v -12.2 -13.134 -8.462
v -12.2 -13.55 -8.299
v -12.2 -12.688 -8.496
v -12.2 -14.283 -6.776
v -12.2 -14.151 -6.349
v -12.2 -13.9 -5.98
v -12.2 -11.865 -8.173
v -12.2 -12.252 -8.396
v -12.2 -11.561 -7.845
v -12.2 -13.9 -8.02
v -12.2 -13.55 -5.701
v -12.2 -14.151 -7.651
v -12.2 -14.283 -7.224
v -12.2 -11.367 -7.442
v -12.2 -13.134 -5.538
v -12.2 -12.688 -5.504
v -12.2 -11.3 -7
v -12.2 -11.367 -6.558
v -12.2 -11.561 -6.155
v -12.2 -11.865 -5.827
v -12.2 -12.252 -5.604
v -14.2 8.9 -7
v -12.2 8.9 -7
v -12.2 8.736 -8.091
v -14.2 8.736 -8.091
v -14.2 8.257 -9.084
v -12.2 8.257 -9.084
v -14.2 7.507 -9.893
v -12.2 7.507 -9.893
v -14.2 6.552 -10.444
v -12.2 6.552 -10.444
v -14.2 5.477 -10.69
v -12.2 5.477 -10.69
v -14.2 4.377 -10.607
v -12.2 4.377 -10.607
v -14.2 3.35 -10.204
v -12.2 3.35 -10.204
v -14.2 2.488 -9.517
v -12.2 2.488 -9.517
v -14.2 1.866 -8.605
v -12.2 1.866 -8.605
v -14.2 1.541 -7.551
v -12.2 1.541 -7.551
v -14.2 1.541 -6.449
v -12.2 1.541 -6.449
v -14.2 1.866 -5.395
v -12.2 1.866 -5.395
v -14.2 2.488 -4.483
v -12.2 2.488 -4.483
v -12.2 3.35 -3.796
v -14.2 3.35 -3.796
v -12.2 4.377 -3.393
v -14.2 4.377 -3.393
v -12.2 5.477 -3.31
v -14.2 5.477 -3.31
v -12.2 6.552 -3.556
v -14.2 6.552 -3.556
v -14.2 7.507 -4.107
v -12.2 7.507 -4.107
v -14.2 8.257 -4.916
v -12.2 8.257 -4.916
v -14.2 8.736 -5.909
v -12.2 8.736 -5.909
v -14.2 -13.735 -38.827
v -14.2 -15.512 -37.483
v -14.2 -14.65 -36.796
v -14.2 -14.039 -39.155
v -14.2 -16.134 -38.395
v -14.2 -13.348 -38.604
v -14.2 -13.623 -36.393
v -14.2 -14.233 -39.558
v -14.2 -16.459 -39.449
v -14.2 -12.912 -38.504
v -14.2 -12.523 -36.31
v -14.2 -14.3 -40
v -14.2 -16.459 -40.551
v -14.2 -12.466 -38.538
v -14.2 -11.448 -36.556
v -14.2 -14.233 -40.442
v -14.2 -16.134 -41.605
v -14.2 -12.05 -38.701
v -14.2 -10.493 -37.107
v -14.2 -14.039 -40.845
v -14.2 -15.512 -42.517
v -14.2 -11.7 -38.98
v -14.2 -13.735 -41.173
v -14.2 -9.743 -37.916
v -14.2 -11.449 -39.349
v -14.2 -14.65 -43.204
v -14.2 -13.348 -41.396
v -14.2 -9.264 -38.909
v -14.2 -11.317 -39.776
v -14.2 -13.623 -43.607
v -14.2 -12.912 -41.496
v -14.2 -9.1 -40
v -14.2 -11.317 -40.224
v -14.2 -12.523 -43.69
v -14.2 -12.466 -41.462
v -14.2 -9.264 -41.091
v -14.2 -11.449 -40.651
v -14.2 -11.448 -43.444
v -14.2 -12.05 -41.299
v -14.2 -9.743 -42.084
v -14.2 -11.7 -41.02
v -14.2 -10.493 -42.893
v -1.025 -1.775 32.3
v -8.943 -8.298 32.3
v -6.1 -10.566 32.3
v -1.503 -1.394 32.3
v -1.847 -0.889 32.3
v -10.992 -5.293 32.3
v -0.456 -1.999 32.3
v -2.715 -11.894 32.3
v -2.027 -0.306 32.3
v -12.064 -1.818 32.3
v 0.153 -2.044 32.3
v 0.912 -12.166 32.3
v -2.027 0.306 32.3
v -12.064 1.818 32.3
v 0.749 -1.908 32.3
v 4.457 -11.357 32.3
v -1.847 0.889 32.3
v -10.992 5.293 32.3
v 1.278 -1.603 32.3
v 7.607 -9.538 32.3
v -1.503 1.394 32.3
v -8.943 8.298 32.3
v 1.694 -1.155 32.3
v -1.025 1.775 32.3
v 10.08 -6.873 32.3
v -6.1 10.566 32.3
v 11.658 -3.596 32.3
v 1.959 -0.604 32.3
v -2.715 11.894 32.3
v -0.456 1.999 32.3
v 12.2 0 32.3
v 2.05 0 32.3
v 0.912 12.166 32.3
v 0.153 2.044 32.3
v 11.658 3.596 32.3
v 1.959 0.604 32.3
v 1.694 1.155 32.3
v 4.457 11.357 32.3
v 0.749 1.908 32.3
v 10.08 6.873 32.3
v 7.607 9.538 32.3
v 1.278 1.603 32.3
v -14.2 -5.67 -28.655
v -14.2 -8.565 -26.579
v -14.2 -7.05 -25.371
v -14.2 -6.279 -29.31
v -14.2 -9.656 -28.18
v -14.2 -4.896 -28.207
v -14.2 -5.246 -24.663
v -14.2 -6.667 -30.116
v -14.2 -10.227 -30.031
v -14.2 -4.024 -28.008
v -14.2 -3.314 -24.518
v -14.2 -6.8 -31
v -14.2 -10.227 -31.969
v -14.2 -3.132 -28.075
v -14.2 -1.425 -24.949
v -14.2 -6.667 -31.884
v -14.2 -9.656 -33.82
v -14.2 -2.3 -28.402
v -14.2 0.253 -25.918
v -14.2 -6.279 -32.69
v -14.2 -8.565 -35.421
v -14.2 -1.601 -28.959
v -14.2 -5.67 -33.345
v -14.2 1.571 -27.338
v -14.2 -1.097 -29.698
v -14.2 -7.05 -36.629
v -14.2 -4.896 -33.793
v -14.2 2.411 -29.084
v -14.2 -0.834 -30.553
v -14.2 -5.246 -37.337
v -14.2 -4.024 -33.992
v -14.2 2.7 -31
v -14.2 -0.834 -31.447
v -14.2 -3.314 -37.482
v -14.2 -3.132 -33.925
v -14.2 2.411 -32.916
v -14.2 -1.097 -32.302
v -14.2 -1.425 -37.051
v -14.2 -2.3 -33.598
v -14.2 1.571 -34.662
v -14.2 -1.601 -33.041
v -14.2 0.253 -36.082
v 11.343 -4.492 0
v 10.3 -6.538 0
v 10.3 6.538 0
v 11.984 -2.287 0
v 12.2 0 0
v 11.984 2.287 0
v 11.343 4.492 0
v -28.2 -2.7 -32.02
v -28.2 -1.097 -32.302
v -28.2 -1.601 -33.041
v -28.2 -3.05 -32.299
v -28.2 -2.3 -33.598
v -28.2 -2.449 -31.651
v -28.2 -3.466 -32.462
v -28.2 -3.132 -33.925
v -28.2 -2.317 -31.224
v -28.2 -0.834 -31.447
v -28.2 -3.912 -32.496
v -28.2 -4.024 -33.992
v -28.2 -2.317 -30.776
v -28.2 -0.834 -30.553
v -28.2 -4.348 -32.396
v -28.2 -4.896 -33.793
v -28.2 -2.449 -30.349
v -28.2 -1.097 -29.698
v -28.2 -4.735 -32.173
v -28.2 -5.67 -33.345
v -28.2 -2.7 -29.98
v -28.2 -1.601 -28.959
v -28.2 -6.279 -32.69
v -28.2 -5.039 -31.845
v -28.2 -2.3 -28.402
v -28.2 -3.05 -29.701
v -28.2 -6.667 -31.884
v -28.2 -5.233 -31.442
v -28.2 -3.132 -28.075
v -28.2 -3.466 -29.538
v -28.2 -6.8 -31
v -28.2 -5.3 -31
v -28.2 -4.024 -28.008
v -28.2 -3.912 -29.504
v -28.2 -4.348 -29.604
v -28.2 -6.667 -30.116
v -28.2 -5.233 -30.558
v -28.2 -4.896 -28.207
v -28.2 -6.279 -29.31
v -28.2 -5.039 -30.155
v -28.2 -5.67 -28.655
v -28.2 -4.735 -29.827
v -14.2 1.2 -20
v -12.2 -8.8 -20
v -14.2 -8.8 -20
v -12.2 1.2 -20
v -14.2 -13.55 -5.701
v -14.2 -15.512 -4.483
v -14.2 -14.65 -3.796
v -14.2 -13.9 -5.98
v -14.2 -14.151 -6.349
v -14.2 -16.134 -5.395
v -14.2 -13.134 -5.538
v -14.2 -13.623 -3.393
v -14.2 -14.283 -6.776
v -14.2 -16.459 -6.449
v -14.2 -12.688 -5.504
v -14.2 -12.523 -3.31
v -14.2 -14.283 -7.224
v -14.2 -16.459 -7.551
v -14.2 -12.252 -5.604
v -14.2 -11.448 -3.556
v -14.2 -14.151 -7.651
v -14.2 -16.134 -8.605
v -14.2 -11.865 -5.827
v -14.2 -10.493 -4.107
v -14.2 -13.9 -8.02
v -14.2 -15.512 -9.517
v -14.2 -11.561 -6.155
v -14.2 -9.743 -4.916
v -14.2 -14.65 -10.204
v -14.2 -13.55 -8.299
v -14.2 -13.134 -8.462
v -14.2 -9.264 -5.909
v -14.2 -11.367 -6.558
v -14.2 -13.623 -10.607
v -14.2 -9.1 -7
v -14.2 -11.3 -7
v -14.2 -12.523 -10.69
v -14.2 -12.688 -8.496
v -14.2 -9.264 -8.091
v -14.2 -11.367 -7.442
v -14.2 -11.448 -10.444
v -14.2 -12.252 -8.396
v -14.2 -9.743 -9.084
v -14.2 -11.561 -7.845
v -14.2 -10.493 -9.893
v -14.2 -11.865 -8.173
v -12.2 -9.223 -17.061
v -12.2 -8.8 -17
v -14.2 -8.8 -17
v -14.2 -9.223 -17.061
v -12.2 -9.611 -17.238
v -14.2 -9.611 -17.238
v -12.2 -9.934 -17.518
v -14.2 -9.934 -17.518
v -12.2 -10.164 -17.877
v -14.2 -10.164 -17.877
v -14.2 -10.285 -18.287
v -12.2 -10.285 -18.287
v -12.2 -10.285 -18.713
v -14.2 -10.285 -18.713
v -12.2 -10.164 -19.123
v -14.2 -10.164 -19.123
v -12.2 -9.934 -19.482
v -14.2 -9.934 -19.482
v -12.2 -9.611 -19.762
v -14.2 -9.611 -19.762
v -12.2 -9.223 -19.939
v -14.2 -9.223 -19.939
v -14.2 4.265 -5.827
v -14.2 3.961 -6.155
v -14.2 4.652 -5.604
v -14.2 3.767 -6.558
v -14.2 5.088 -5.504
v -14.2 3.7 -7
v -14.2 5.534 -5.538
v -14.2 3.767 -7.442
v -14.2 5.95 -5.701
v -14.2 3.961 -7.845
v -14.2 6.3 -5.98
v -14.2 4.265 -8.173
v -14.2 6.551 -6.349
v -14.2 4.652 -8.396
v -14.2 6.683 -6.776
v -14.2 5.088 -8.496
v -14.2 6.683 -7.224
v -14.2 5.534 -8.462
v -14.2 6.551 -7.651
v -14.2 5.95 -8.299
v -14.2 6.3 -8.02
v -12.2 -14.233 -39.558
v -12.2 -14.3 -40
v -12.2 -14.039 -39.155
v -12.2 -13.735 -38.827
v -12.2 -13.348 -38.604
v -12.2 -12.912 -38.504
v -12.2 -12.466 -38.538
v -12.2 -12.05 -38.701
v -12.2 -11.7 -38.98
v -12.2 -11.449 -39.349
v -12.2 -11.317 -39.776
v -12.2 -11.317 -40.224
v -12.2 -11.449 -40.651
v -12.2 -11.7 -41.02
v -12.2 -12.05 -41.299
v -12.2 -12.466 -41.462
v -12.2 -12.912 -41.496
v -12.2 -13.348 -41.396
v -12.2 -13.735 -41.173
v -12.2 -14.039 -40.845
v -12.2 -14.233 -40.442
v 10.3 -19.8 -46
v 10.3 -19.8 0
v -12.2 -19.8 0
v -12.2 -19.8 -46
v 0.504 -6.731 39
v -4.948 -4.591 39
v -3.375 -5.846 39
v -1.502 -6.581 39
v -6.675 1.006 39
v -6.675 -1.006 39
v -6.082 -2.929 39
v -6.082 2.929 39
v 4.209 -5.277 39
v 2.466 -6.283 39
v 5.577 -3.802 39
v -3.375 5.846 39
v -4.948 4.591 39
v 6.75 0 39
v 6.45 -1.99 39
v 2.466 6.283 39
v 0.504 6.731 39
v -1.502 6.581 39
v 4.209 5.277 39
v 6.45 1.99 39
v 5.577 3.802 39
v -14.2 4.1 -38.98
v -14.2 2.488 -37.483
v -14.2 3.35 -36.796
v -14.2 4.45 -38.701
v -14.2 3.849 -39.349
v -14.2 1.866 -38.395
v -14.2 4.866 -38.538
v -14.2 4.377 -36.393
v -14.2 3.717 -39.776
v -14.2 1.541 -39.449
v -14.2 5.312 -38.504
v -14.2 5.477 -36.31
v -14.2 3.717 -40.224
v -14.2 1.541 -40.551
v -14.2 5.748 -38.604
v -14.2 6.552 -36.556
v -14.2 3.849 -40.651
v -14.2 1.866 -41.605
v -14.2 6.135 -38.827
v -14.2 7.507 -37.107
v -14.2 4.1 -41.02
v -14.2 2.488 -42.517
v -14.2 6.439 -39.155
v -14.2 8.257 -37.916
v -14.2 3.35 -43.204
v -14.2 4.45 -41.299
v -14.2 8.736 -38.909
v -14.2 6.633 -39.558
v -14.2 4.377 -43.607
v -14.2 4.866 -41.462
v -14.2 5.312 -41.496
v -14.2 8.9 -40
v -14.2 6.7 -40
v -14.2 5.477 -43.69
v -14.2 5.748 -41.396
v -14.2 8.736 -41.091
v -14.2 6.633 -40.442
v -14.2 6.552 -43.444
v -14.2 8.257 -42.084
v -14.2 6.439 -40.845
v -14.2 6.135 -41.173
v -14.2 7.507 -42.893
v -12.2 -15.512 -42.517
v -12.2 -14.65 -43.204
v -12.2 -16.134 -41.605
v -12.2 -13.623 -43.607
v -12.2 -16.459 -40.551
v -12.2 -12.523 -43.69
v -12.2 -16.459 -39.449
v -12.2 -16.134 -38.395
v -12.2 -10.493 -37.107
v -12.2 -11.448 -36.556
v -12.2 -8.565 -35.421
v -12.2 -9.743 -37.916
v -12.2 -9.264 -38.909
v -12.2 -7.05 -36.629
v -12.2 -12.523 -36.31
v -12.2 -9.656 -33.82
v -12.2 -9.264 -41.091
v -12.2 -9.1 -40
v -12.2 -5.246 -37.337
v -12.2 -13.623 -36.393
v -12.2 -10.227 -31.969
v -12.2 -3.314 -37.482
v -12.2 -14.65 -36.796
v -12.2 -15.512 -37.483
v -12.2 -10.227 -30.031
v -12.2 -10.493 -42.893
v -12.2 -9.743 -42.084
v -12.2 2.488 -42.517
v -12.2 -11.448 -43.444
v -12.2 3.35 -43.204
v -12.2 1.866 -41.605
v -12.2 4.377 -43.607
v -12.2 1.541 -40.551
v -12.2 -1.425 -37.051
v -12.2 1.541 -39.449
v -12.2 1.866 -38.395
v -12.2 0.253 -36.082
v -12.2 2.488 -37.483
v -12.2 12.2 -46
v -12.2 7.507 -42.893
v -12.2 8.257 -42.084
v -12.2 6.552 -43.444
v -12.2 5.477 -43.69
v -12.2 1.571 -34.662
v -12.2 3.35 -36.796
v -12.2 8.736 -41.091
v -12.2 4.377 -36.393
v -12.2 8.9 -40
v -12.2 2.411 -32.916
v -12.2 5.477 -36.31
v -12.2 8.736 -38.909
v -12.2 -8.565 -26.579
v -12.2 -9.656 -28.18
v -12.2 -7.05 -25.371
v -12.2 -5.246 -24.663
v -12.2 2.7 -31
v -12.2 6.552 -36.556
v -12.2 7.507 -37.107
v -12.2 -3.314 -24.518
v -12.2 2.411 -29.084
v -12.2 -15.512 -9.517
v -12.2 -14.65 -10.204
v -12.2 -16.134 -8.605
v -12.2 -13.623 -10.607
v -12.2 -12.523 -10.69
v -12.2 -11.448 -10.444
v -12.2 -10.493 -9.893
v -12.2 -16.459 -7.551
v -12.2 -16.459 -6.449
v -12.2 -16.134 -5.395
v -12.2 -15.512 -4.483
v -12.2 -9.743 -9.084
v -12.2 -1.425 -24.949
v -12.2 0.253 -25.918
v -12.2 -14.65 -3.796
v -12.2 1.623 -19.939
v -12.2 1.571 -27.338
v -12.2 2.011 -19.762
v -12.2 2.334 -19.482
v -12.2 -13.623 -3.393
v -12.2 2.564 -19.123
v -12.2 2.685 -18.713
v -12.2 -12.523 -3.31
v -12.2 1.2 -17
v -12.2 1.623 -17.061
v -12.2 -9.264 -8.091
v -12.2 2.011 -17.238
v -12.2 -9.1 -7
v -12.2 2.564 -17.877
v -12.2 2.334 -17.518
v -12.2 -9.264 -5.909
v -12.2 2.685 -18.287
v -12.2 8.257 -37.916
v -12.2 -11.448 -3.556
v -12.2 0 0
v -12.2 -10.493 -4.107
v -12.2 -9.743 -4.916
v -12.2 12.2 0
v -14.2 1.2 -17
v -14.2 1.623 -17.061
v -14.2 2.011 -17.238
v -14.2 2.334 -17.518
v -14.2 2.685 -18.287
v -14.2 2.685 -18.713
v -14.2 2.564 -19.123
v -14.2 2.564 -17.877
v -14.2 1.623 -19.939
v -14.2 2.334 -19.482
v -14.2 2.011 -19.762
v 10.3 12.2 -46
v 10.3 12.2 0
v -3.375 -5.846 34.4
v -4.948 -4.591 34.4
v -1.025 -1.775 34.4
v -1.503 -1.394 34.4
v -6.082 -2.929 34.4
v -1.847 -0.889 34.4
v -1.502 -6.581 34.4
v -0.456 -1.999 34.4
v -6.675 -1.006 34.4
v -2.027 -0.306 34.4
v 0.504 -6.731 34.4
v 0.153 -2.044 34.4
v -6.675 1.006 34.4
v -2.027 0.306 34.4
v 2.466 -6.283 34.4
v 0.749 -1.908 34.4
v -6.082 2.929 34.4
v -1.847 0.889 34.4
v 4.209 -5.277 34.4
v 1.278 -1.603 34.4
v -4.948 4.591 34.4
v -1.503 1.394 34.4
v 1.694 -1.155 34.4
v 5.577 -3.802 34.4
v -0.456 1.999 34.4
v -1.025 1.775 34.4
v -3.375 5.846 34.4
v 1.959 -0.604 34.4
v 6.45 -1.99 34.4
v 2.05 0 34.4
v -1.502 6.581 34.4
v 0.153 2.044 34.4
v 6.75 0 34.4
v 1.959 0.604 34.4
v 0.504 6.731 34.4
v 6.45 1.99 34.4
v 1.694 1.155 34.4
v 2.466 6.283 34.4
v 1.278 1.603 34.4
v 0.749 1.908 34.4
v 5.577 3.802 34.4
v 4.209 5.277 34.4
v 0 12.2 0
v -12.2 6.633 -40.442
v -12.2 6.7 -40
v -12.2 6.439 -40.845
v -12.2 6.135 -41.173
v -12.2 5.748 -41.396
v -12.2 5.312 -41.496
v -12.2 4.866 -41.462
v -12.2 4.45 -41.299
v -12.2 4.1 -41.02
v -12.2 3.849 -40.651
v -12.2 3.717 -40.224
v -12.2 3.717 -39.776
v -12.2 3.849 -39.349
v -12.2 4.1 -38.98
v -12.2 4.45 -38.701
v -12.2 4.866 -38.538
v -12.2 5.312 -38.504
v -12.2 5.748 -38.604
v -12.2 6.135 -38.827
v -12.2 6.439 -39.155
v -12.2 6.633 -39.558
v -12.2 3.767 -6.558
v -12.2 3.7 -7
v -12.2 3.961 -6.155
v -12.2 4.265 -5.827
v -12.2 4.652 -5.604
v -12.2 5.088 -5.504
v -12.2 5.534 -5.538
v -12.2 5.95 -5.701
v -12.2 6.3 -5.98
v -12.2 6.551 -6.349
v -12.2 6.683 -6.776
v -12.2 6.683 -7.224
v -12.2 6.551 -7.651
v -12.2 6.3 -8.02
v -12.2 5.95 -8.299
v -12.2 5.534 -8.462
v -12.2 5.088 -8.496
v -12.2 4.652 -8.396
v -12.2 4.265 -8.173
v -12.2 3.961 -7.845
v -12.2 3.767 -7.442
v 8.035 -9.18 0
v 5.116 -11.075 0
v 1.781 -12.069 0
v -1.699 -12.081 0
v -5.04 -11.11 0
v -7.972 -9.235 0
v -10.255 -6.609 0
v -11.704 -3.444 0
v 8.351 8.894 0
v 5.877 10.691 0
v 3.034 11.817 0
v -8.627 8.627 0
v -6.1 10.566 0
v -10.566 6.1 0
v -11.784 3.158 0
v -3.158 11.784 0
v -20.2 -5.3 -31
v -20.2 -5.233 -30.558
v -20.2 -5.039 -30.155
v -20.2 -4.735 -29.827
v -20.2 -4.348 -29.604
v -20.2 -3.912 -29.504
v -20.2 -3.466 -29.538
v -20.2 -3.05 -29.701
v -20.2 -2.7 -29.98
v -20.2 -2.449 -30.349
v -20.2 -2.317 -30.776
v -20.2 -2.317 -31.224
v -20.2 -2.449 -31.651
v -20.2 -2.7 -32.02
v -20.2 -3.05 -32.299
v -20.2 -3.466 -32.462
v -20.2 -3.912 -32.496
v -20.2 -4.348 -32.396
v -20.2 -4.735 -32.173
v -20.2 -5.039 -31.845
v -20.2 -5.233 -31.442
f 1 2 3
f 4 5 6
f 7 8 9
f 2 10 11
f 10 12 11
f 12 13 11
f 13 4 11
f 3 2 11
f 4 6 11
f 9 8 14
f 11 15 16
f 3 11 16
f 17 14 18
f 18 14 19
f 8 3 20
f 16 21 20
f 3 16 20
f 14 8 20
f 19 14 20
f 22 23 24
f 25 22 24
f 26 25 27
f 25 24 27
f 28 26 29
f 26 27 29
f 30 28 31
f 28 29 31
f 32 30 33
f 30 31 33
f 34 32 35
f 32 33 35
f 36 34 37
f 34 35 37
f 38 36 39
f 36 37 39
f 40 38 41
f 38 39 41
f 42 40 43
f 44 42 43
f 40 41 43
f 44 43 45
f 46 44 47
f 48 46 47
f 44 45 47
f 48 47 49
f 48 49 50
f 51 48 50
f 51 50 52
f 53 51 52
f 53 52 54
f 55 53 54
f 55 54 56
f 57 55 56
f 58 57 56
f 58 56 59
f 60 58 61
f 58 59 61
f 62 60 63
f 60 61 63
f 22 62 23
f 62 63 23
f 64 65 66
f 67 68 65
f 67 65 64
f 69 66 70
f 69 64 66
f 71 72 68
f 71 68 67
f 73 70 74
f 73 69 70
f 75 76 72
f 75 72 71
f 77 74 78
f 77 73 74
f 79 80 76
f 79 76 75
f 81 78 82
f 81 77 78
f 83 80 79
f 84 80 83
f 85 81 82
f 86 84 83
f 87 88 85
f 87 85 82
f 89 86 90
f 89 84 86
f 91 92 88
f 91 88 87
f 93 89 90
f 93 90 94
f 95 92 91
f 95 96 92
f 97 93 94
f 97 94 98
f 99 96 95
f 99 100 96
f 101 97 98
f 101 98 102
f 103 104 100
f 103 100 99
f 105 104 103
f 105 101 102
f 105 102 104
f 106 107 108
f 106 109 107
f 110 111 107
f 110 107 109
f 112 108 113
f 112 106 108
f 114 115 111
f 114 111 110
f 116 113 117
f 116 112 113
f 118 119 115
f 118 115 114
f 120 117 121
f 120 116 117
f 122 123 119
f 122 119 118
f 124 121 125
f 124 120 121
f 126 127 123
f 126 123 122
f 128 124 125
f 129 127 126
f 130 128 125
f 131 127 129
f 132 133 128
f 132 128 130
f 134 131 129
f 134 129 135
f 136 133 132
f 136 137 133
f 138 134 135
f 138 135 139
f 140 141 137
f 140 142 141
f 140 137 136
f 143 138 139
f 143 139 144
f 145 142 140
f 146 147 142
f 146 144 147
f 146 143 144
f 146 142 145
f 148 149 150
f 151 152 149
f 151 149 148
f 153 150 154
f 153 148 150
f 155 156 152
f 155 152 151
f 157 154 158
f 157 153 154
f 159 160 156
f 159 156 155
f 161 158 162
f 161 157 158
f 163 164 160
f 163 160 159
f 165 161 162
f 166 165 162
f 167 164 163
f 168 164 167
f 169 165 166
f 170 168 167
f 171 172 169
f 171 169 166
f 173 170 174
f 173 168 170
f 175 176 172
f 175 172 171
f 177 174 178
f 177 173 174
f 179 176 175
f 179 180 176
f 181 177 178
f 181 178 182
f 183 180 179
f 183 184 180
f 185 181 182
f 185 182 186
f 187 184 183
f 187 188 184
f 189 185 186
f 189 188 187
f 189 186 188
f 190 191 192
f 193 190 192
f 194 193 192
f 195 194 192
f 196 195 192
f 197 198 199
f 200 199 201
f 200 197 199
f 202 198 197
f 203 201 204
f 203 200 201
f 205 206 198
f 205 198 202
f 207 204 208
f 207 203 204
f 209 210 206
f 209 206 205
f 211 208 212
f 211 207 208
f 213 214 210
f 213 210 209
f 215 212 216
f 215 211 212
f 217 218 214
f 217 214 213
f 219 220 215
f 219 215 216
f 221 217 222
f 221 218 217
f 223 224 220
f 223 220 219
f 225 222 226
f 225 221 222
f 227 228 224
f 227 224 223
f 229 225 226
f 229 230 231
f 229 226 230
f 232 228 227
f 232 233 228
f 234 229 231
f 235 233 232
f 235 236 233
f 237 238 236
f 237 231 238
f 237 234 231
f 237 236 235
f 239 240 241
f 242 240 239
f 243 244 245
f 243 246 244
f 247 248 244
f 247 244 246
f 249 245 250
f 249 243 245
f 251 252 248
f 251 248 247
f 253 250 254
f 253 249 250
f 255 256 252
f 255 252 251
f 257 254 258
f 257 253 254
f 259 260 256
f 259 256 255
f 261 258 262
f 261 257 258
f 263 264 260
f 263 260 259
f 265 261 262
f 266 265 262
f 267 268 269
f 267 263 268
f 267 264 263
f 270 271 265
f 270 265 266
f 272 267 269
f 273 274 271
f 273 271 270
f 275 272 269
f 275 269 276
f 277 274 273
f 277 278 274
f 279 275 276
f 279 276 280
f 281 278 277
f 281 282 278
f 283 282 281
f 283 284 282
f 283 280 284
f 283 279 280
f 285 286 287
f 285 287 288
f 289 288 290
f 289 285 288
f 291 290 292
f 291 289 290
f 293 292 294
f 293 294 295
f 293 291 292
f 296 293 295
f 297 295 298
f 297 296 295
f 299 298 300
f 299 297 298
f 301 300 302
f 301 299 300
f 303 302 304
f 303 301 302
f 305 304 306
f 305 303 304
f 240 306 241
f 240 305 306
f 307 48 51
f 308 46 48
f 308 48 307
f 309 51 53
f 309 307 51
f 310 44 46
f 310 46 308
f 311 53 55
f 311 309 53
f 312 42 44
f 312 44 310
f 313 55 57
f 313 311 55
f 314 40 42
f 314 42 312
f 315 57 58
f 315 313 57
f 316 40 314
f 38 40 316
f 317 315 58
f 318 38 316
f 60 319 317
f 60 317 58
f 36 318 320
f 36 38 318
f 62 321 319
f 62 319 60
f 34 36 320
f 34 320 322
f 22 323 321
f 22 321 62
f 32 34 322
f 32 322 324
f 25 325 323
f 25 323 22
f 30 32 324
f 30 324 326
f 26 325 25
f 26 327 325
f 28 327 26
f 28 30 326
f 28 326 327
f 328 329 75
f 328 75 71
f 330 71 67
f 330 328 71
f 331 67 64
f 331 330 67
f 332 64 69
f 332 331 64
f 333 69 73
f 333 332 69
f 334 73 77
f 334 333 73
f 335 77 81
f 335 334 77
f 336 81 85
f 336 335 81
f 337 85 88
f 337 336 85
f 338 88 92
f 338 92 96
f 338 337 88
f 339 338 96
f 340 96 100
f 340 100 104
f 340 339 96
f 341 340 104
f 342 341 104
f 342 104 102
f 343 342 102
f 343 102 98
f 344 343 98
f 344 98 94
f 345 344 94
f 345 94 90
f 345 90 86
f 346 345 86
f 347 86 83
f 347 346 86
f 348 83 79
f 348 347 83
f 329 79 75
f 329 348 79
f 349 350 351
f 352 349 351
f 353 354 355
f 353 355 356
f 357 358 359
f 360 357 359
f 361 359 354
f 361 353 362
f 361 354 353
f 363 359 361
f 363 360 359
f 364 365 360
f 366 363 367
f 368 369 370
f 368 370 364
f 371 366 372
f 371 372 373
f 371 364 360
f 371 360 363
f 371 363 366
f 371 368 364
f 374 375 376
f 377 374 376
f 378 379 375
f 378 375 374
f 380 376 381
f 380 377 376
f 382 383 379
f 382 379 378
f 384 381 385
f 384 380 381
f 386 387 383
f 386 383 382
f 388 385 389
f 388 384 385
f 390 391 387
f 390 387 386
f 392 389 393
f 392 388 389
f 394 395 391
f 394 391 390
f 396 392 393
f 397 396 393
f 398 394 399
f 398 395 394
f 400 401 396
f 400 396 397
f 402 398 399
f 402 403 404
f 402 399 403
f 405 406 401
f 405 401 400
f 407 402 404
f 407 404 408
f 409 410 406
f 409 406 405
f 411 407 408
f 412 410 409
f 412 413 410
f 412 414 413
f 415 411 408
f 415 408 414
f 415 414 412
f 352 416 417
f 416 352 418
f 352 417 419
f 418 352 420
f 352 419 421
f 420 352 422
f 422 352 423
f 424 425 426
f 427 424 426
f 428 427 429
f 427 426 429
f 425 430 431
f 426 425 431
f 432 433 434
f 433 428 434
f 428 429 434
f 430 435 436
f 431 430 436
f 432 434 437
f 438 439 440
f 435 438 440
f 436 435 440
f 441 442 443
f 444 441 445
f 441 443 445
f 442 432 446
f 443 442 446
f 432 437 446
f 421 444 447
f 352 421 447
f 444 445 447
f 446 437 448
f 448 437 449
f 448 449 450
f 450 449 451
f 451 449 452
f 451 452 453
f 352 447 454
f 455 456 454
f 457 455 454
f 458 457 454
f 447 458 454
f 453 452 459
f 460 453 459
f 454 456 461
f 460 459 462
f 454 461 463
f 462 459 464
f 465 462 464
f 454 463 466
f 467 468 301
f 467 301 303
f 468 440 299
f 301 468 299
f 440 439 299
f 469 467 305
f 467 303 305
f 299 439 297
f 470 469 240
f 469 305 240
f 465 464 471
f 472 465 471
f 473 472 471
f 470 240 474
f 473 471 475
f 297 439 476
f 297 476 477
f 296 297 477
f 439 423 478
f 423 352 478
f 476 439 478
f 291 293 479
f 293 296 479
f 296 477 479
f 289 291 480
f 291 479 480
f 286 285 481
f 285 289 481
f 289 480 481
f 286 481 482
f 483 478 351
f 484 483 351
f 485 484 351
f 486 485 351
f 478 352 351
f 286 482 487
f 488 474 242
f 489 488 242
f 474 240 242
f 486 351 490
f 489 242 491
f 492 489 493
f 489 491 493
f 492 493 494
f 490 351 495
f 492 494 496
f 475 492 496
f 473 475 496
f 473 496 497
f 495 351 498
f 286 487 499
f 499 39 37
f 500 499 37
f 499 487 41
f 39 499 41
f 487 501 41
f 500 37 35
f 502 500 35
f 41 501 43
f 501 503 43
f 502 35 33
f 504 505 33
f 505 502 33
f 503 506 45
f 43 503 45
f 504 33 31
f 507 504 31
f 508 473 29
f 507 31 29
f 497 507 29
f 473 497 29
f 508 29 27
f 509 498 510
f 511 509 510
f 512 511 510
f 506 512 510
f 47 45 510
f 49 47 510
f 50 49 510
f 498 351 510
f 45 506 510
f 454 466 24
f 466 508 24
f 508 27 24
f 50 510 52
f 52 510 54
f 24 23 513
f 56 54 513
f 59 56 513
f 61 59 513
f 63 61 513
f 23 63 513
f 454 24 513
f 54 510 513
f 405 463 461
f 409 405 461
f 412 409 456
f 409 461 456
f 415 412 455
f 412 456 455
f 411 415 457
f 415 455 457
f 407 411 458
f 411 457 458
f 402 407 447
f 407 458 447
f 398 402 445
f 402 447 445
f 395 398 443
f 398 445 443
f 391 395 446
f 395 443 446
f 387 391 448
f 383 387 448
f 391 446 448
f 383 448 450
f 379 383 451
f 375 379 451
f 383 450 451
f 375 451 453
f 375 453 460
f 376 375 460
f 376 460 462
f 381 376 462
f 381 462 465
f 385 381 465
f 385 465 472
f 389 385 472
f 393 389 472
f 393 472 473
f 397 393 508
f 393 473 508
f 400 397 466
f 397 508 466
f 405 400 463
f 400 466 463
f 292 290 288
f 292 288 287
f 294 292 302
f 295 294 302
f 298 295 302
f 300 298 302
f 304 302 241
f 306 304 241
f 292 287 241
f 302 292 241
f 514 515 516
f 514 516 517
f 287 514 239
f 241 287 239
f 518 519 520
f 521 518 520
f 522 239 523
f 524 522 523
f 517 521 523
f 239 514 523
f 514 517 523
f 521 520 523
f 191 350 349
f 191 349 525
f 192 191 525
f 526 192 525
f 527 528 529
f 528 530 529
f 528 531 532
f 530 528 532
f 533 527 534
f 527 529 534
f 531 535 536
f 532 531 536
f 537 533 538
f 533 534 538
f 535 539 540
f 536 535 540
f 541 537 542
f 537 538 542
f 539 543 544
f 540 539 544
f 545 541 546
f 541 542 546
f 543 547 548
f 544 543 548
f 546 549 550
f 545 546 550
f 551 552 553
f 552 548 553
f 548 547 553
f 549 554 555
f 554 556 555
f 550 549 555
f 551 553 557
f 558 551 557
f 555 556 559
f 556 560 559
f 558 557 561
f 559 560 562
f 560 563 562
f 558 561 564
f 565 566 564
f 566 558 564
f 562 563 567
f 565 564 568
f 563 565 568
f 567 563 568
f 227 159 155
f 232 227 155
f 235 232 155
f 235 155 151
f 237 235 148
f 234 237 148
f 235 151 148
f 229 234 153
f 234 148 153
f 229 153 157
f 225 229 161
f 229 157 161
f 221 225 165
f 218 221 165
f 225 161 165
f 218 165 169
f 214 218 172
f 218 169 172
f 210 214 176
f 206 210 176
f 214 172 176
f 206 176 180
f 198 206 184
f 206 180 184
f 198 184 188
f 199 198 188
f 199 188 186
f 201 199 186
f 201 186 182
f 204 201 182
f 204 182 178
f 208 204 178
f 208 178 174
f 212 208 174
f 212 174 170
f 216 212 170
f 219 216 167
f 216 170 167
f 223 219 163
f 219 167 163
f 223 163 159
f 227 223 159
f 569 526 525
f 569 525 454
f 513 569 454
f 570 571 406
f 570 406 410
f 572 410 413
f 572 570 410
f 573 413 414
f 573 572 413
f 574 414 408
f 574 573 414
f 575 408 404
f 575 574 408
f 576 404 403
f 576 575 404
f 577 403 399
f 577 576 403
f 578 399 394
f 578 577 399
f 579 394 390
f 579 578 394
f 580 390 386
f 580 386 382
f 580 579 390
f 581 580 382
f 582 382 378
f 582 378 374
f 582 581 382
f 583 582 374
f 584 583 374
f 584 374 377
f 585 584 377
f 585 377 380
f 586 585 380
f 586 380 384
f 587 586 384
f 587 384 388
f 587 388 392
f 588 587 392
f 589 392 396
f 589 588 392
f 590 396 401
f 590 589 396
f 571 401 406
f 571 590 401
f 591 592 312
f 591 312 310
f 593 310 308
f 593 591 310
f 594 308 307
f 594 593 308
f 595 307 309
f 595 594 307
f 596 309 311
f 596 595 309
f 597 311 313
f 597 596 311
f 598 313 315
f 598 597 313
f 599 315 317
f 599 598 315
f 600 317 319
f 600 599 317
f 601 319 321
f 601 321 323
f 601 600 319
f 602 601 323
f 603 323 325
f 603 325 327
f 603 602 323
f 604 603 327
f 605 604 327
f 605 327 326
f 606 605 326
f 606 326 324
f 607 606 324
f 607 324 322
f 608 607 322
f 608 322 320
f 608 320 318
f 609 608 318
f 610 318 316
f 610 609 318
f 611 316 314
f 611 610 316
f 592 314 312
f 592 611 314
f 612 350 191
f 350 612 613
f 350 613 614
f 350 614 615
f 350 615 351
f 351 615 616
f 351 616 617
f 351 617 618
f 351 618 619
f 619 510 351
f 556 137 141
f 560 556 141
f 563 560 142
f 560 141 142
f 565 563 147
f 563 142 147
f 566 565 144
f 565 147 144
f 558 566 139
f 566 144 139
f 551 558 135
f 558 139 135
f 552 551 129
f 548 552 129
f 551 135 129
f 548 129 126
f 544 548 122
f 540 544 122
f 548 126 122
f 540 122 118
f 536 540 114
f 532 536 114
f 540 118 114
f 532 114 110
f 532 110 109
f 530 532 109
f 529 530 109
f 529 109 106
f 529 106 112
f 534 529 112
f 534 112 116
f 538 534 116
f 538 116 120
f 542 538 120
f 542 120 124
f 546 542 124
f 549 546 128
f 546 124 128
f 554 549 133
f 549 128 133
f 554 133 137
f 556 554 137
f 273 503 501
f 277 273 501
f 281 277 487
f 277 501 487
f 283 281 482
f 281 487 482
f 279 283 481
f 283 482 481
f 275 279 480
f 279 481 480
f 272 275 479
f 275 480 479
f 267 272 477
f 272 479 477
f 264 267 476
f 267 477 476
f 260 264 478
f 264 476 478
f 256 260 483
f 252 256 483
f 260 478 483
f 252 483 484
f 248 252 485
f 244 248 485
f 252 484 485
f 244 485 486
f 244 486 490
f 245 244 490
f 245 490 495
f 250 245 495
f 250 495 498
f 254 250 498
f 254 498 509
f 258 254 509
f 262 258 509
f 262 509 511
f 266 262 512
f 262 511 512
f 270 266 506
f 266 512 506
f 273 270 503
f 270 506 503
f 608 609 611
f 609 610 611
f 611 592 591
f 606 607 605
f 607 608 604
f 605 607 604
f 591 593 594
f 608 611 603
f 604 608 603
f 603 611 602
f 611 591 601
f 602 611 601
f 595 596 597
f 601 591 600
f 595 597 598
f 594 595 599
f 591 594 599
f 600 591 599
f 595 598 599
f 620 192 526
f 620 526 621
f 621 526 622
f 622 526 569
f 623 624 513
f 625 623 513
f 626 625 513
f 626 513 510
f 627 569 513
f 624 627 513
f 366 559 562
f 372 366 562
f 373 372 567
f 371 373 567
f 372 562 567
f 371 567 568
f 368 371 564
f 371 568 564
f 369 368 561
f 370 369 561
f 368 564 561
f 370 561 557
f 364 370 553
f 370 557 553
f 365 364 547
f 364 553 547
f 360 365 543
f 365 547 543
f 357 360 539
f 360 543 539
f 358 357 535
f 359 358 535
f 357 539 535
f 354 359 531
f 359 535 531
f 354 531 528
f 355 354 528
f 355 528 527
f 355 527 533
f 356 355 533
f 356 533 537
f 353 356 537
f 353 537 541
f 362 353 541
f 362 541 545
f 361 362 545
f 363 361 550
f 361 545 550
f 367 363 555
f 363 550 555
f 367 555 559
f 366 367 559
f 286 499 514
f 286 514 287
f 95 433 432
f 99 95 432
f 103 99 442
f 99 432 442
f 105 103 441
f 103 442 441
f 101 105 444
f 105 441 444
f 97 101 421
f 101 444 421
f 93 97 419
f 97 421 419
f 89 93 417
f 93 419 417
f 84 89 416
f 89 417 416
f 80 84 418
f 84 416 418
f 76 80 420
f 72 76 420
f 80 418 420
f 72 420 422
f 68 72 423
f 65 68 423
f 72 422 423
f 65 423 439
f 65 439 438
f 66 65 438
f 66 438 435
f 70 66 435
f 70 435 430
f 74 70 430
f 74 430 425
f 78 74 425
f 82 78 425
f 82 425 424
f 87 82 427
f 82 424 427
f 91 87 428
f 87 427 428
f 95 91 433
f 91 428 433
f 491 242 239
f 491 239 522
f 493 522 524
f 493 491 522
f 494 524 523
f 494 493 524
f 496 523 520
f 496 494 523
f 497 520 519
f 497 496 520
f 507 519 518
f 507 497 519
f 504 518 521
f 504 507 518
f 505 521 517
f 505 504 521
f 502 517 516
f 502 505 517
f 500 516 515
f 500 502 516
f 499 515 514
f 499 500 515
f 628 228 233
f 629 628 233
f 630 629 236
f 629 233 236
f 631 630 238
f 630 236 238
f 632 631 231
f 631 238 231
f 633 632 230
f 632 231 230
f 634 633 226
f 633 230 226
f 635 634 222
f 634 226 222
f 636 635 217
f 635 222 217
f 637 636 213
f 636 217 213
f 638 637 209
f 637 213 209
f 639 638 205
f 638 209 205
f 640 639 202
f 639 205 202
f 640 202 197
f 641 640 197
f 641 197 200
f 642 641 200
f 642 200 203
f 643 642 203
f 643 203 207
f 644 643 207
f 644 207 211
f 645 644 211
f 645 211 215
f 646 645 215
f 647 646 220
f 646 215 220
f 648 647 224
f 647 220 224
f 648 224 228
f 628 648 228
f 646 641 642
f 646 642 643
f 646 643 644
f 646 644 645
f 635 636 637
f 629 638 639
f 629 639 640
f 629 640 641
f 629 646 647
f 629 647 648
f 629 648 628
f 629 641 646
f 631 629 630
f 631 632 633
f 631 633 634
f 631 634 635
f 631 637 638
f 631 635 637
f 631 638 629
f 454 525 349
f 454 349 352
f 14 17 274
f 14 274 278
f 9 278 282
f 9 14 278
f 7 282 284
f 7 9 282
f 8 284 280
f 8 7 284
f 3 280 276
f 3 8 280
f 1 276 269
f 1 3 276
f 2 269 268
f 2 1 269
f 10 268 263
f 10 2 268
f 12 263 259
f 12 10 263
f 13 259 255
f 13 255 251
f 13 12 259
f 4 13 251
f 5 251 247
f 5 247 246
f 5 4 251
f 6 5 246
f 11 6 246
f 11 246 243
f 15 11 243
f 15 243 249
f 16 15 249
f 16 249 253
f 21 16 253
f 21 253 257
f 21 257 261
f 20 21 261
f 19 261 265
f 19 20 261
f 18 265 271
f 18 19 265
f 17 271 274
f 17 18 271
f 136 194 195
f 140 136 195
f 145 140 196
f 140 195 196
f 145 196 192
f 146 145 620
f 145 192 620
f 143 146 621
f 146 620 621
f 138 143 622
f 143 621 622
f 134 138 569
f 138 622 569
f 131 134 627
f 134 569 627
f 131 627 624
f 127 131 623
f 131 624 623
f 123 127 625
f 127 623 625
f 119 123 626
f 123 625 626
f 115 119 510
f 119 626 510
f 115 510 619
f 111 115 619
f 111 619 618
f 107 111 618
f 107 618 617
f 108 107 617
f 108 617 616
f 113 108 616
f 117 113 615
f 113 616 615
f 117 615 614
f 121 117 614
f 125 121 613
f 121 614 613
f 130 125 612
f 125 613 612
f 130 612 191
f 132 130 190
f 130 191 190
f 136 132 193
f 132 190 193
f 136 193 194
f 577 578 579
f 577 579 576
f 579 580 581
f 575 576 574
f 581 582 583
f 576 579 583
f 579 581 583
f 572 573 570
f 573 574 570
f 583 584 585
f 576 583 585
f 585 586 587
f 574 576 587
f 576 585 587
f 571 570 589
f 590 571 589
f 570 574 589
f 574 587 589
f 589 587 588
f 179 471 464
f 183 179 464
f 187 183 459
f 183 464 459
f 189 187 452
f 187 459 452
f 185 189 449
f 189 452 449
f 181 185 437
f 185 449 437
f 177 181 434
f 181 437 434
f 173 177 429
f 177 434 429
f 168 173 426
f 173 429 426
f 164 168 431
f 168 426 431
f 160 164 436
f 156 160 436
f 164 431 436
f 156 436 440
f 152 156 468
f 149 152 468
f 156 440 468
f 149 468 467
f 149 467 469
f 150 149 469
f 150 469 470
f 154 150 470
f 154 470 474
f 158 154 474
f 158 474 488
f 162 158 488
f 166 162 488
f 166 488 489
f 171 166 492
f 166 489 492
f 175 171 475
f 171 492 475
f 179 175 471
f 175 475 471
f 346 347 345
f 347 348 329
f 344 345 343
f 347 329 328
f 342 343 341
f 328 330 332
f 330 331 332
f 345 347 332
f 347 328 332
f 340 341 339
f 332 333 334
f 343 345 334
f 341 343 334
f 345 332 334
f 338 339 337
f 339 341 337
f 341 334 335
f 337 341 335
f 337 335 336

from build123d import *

# Parameters (mm, degrees)
SKETCH1_R      = 12.2
EXTRUDE1_DEPTH = 32.3
SKETCH2_R      = 2.05
EXTRUDE2_DEPTH = 2.1
SKETCH3_R      = 6.75
EXTRUDE3_DEPTH = 4.6
SKETCH4_W      = 22.5
SKETCH4_H      = 32
EXTRUDE4_DEPTH = 46
SKETCH5_R      = 3.7
SKETCH5_R_2    = 1.5
SKETCH5_R_3    = 6.5
EXTRUDE5_DEPTH = 2
SKETCH6_R      = 3
EXTRUDE6_DEPTH = 14
SKETCH7_R      = 1.5
EXTRUDE7_DEPTH = 8


with BuildPart() as part:
    # Sketch1 → Extrude1 (new body)
    with BuildSketch(Plane.XY):
        Circle(SKETCH1_R)
    extrude(amount=EXTRUDE1_DEPTH)

    # Sketch2 → Extrude2 (add)
    with BuildSketch(Plane.XY.offset(32.3)):
        Circle(SKETCH2_R)
    extrude(amount=EXTRUDE2_DEPTH)

    # Sketch3 → Extrude3 (add)
    with BuildSketch(Plane.XY.offset(34.4)):
        Circle(SKETCH3_R)
    extrude(amount=EXTRUDE3_DEPTH)

    # Sketch4 → Extrude4 (add)
    with BuildSketch(Plane(origin=(0, 0, 0), x_dir=(-1, 0, 0), z_dir=(0, 0, -1))):
        with Locations((0.95, -3.8)):
            Rectangle(SKETCH4_W, SKETCH4_H)
    extrude(amount=EXTRUDE4_DEPTH)

    # Sketch5 → Extrude5 (add)
    # profile 1 of 6: a face of its own
    with BuildSketch(Plane.ZY.offset(12.2)):
        with Locations(Location((-40, -12.8, 0), (0, 0, 90))):
            Circle(SKETCH5_R)
        with Locations(Location((-40, -12.8, 0), (0, 0, 270))):
            Circle(SKETCH5_R_2, mode=Mode.SUBTRACT)
    # profile 2 of 6: a face of its own
    with BuildSketch(Plane.ZY.offset(12.2)):
        with Locations(Location((-40, 5.2, 0), (0, 0, 90))):
            Circle(SKETCH5_R)
        with Locations(Location((-40, 5.2, 0), (0, 0, 90))):
            Circle(SKETCH5_R_2, mode=Mode.SUBTRACT)
    # profile 3 of 6: a face of its own
    with BuildSketch(Plane.ZY.offset(12.2)):
        with Locations(Location((-7, 5.2, 0), (0, 0, 90))):
            Circle(SKETCH5_R)
        with Locations(Location((-7, 5.2, 0), (0, 0, 270))):
            Circle(SKETCH5_R_2, mode=Mode.SUBTRACT)
    # profile 4 of 6: a face of its own
    with BuildSketch(Plane.ZY.offset(12.2)):
        with Locations(Location((-7, -12.8, 0), (0, 0, 90))):
            Circle(SKETCH5_R)
        with Locations(Location((-7, -12.8, 0), (0, 0, 90))):
            Circle(SKETCH5_R_2, mode=Mode.SUBTRACT)
    # profile 5 of 6: a face of its own
    with BuildSketch(Plane.ZY.offset(12.2)):
        with Locations(Location((-31, -3.8, 0), (0, 0, 90))):
            Circle(SKETCH5_R_3)
    # profile 6 of 6: a face of its own
    with BuildSketch(Plane.ZY.offset(12.2)):
        with BuildLine():
            Line((-20, -8.8), (-20, 1.2))
            ThreePointArc((-20, 1.2), (-18.5, 2.7), (-17, 1.2))
            Line((-17, 1.2), (-17, -8.8))
            ThreePointArc((-17, -8.8), (-18.5, -10.3), (-20, -8.8))
        make_face()
    extrude(amount=EXTRUDE5_DEPTH)

    # Sketch6 → Extrude6 (add)
    with BuildSketch(Plane.ZY.offset(14.2)):
        with Locations(Location((-31, -3.8, 0), (0, 0, 270))):
            Circle(SKETCH6_R)
    extrude(amount=EXTRUDE6_DEPTH)

    # Sketch7 → Extrude7 (cut)
    with BuildSketch(Plane.ZY.offset(28.2)):
        with Locations(Location((-31, -3.8, 0), (0, 0, 270))):
            Circle(SKETCH7_R)
    extrude(amount=-EXTRUDE7_DEPTH, mode=Mode.SUBTRACT)


solid = part.part
